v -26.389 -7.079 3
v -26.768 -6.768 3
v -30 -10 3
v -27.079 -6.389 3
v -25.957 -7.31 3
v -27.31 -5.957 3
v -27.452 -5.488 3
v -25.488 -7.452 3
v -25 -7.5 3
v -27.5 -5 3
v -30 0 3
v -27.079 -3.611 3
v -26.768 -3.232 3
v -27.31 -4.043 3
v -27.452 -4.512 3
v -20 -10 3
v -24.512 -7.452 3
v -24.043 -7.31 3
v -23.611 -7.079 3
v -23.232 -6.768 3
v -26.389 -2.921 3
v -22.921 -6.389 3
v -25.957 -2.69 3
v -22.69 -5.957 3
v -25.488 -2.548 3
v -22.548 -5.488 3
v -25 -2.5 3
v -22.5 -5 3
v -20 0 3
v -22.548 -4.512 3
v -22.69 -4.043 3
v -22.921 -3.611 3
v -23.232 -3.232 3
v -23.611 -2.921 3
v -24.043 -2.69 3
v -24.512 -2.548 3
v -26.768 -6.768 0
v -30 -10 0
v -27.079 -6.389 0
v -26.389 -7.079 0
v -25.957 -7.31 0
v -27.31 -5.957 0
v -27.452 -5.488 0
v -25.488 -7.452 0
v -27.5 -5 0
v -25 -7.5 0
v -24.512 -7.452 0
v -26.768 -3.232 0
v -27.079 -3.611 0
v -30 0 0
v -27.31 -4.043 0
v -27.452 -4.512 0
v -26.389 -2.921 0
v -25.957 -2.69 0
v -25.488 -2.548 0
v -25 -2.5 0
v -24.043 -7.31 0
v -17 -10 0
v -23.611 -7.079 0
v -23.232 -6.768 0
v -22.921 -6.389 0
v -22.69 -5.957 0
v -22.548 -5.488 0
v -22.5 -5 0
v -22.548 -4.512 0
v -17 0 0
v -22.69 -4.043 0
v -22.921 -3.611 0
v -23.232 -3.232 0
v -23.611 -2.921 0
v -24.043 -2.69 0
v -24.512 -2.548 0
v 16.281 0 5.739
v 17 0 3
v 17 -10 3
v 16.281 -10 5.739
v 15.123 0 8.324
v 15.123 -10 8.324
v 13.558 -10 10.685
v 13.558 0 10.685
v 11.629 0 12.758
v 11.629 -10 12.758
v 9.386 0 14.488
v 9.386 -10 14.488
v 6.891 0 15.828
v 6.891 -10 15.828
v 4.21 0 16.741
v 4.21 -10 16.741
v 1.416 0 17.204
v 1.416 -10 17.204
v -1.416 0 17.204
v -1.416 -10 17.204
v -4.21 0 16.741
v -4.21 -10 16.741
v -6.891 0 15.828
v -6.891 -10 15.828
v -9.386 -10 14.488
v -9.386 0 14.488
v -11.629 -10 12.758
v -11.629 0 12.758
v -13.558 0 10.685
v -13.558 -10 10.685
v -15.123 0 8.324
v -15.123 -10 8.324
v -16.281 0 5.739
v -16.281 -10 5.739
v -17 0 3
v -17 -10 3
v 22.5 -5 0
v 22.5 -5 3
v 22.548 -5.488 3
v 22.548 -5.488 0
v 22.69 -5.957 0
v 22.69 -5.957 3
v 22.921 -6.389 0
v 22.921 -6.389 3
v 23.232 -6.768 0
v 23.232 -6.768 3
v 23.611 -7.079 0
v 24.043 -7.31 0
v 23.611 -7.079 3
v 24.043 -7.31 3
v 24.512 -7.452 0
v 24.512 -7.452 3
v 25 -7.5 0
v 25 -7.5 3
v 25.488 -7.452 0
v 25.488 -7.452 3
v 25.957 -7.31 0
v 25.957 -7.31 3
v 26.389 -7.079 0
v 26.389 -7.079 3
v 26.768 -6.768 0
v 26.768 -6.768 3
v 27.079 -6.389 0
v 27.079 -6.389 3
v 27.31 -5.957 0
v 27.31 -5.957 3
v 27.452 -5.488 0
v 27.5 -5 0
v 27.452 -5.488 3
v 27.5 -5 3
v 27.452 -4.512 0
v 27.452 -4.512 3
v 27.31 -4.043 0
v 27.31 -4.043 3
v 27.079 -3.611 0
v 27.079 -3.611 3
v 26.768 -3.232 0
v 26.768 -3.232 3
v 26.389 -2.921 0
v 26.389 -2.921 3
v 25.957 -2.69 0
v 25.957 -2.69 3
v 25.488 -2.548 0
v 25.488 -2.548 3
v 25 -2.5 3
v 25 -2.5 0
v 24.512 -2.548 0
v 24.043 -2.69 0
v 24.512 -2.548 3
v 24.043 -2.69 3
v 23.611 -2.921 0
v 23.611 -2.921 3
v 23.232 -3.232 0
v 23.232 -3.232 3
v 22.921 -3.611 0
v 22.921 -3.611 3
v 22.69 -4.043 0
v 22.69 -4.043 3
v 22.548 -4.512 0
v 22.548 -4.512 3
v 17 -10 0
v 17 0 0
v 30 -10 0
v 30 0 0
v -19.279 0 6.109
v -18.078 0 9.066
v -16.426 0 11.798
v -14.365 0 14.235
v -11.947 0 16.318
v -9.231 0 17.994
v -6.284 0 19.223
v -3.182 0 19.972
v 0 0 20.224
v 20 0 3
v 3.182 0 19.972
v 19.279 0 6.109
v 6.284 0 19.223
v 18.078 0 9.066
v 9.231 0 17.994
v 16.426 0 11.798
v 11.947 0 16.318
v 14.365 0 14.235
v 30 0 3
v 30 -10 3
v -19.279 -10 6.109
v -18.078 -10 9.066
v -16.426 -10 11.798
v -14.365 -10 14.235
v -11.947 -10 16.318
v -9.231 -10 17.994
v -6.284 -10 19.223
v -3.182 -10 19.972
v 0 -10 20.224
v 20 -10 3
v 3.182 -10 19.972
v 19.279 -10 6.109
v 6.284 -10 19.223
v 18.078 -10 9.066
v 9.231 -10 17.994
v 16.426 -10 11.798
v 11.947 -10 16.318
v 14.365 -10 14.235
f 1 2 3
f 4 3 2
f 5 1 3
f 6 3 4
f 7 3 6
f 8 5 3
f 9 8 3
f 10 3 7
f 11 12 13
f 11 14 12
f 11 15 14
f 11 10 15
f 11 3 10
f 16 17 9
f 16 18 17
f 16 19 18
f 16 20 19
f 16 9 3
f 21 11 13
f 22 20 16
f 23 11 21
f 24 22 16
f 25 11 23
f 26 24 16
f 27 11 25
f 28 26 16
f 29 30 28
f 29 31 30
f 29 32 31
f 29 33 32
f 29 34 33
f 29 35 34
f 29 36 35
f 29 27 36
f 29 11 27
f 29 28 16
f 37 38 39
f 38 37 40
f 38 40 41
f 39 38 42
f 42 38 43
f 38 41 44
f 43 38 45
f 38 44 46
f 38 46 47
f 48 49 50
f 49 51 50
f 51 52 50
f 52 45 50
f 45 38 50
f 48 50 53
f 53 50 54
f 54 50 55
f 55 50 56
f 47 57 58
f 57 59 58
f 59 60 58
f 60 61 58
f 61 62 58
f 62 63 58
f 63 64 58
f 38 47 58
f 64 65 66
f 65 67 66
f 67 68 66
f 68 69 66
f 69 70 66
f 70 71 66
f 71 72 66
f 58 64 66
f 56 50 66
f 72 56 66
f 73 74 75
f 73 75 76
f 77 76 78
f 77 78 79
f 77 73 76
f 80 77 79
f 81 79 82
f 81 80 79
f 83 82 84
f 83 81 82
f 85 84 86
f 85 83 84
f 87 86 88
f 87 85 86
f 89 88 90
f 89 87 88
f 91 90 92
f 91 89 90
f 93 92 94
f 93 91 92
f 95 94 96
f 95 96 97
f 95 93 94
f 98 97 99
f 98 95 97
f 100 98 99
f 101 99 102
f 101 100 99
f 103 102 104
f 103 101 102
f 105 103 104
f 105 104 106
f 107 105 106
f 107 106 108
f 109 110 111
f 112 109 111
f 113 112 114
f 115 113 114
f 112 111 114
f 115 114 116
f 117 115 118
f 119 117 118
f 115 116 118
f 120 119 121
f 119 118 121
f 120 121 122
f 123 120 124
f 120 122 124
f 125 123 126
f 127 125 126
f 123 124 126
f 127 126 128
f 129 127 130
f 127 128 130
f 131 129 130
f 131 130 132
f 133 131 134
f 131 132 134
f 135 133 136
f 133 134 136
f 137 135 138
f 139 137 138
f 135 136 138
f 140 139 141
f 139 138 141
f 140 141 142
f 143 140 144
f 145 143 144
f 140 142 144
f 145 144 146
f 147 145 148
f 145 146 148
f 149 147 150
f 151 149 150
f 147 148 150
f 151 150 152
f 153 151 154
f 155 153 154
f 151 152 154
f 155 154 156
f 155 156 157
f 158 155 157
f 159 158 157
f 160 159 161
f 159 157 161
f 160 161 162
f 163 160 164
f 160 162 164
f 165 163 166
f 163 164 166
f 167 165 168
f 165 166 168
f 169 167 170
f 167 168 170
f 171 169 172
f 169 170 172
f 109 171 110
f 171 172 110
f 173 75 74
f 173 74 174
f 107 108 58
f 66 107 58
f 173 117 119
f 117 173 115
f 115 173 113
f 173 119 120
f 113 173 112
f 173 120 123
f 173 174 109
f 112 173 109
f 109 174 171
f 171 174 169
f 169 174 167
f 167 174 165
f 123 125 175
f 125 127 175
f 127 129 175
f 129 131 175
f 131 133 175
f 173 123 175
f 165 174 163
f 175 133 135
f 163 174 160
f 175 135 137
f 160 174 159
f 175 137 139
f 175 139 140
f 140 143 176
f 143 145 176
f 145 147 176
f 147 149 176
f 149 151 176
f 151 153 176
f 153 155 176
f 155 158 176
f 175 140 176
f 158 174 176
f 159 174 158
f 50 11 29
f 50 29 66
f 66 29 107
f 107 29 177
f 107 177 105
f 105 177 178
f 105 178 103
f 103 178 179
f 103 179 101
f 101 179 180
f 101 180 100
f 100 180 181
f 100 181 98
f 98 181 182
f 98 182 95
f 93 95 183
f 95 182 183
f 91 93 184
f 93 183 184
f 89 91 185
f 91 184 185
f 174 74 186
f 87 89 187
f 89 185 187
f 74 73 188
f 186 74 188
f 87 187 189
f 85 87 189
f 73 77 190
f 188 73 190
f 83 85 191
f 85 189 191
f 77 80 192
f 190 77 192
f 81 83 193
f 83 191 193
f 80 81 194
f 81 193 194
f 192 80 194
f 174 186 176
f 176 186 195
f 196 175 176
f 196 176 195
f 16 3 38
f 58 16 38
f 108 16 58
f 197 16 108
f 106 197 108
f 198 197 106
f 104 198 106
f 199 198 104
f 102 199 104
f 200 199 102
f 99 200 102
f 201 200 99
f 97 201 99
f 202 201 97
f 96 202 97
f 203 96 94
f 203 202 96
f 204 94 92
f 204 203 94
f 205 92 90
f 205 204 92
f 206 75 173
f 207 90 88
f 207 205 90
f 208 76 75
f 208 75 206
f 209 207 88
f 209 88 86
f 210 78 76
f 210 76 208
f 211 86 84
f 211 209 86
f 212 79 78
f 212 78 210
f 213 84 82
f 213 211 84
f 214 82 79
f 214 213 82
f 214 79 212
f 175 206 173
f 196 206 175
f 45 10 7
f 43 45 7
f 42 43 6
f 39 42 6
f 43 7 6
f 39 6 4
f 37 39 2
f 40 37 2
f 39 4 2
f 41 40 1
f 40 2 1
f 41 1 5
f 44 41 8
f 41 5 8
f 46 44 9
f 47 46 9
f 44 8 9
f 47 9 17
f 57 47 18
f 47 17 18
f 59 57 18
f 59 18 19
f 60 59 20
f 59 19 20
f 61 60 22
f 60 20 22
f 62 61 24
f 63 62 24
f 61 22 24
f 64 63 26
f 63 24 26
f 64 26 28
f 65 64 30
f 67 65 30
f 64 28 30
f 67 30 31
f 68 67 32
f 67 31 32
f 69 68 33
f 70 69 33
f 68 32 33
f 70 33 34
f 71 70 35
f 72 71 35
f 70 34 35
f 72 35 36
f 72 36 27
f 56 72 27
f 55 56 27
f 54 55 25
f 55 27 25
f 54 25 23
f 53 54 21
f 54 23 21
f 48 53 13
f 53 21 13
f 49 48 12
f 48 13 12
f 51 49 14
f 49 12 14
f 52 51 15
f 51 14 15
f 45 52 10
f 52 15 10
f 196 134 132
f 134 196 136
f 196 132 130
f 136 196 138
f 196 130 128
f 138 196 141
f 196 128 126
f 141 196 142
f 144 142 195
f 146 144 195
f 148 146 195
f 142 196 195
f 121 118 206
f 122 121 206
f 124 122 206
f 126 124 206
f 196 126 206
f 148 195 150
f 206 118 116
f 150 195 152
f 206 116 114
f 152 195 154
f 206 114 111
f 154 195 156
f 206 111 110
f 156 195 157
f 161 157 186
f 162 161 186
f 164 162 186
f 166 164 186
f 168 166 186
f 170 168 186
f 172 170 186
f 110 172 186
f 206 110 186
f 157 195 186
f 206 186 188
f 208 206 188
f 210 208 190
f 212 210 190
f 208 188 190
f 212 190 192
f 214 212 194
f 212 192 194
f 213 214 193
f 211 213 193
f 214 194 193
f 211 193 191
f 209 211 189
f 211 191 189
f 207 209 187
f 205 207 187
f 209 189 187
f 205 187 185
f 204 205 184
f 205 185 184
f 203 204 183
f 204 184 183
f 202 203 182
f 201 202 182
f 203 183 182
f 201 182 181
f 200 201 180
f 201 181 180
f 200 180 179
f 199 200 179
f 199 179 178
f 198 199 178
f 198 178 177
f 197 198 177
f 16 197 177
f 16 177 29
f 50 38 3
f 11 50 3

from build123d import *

# Parameters (mm, degrees)
PAD_DEPTH    = 10
SKETCH001_R  = 2.5
POCKET_DEPTH = 3


with BuildPart() as part:
    # Sketch → Pad (new body)
    with BuildSketch(Plane.XZ):
        with BuildLine():
            Line((-30, 0), (-17, 0))
            Line((-17, 3), (-17, 0))
            ThreePointArc((17, 3), (0, 17.262677), (-17, 3))
            Line((17, 3), (17, 0))
            Line((17, 0), (30, 0))
            Line((30, 0), (30, 3))
            Line((30, 3), (20, 3))
            ThreePointArc((20, 3), (0, 20.223748), (-20, 3))
            Line((-30, 3), (-20, 3))
            Line((-30, 0), (-30, 3))
        make_face()
    extrude(amount=PAD_DEPTH)

    # Sketch001 (on Face8 of Pad) → Pocket (cut)
    with BuildSketch(Plane(origin=(0, 0, 3), x_dir=(-1, 0, 0), z_dir=(0, 0, 1))):
        with Locations((25, 5)):
            Circle(SKETCH001_R)
        with Locations((-25, 5)):
            Circle(SKETCH001_R)
    extrude(amount=-POCKET_DEPTH, mode=Mode.SUBTRACT)


solid = part.part
